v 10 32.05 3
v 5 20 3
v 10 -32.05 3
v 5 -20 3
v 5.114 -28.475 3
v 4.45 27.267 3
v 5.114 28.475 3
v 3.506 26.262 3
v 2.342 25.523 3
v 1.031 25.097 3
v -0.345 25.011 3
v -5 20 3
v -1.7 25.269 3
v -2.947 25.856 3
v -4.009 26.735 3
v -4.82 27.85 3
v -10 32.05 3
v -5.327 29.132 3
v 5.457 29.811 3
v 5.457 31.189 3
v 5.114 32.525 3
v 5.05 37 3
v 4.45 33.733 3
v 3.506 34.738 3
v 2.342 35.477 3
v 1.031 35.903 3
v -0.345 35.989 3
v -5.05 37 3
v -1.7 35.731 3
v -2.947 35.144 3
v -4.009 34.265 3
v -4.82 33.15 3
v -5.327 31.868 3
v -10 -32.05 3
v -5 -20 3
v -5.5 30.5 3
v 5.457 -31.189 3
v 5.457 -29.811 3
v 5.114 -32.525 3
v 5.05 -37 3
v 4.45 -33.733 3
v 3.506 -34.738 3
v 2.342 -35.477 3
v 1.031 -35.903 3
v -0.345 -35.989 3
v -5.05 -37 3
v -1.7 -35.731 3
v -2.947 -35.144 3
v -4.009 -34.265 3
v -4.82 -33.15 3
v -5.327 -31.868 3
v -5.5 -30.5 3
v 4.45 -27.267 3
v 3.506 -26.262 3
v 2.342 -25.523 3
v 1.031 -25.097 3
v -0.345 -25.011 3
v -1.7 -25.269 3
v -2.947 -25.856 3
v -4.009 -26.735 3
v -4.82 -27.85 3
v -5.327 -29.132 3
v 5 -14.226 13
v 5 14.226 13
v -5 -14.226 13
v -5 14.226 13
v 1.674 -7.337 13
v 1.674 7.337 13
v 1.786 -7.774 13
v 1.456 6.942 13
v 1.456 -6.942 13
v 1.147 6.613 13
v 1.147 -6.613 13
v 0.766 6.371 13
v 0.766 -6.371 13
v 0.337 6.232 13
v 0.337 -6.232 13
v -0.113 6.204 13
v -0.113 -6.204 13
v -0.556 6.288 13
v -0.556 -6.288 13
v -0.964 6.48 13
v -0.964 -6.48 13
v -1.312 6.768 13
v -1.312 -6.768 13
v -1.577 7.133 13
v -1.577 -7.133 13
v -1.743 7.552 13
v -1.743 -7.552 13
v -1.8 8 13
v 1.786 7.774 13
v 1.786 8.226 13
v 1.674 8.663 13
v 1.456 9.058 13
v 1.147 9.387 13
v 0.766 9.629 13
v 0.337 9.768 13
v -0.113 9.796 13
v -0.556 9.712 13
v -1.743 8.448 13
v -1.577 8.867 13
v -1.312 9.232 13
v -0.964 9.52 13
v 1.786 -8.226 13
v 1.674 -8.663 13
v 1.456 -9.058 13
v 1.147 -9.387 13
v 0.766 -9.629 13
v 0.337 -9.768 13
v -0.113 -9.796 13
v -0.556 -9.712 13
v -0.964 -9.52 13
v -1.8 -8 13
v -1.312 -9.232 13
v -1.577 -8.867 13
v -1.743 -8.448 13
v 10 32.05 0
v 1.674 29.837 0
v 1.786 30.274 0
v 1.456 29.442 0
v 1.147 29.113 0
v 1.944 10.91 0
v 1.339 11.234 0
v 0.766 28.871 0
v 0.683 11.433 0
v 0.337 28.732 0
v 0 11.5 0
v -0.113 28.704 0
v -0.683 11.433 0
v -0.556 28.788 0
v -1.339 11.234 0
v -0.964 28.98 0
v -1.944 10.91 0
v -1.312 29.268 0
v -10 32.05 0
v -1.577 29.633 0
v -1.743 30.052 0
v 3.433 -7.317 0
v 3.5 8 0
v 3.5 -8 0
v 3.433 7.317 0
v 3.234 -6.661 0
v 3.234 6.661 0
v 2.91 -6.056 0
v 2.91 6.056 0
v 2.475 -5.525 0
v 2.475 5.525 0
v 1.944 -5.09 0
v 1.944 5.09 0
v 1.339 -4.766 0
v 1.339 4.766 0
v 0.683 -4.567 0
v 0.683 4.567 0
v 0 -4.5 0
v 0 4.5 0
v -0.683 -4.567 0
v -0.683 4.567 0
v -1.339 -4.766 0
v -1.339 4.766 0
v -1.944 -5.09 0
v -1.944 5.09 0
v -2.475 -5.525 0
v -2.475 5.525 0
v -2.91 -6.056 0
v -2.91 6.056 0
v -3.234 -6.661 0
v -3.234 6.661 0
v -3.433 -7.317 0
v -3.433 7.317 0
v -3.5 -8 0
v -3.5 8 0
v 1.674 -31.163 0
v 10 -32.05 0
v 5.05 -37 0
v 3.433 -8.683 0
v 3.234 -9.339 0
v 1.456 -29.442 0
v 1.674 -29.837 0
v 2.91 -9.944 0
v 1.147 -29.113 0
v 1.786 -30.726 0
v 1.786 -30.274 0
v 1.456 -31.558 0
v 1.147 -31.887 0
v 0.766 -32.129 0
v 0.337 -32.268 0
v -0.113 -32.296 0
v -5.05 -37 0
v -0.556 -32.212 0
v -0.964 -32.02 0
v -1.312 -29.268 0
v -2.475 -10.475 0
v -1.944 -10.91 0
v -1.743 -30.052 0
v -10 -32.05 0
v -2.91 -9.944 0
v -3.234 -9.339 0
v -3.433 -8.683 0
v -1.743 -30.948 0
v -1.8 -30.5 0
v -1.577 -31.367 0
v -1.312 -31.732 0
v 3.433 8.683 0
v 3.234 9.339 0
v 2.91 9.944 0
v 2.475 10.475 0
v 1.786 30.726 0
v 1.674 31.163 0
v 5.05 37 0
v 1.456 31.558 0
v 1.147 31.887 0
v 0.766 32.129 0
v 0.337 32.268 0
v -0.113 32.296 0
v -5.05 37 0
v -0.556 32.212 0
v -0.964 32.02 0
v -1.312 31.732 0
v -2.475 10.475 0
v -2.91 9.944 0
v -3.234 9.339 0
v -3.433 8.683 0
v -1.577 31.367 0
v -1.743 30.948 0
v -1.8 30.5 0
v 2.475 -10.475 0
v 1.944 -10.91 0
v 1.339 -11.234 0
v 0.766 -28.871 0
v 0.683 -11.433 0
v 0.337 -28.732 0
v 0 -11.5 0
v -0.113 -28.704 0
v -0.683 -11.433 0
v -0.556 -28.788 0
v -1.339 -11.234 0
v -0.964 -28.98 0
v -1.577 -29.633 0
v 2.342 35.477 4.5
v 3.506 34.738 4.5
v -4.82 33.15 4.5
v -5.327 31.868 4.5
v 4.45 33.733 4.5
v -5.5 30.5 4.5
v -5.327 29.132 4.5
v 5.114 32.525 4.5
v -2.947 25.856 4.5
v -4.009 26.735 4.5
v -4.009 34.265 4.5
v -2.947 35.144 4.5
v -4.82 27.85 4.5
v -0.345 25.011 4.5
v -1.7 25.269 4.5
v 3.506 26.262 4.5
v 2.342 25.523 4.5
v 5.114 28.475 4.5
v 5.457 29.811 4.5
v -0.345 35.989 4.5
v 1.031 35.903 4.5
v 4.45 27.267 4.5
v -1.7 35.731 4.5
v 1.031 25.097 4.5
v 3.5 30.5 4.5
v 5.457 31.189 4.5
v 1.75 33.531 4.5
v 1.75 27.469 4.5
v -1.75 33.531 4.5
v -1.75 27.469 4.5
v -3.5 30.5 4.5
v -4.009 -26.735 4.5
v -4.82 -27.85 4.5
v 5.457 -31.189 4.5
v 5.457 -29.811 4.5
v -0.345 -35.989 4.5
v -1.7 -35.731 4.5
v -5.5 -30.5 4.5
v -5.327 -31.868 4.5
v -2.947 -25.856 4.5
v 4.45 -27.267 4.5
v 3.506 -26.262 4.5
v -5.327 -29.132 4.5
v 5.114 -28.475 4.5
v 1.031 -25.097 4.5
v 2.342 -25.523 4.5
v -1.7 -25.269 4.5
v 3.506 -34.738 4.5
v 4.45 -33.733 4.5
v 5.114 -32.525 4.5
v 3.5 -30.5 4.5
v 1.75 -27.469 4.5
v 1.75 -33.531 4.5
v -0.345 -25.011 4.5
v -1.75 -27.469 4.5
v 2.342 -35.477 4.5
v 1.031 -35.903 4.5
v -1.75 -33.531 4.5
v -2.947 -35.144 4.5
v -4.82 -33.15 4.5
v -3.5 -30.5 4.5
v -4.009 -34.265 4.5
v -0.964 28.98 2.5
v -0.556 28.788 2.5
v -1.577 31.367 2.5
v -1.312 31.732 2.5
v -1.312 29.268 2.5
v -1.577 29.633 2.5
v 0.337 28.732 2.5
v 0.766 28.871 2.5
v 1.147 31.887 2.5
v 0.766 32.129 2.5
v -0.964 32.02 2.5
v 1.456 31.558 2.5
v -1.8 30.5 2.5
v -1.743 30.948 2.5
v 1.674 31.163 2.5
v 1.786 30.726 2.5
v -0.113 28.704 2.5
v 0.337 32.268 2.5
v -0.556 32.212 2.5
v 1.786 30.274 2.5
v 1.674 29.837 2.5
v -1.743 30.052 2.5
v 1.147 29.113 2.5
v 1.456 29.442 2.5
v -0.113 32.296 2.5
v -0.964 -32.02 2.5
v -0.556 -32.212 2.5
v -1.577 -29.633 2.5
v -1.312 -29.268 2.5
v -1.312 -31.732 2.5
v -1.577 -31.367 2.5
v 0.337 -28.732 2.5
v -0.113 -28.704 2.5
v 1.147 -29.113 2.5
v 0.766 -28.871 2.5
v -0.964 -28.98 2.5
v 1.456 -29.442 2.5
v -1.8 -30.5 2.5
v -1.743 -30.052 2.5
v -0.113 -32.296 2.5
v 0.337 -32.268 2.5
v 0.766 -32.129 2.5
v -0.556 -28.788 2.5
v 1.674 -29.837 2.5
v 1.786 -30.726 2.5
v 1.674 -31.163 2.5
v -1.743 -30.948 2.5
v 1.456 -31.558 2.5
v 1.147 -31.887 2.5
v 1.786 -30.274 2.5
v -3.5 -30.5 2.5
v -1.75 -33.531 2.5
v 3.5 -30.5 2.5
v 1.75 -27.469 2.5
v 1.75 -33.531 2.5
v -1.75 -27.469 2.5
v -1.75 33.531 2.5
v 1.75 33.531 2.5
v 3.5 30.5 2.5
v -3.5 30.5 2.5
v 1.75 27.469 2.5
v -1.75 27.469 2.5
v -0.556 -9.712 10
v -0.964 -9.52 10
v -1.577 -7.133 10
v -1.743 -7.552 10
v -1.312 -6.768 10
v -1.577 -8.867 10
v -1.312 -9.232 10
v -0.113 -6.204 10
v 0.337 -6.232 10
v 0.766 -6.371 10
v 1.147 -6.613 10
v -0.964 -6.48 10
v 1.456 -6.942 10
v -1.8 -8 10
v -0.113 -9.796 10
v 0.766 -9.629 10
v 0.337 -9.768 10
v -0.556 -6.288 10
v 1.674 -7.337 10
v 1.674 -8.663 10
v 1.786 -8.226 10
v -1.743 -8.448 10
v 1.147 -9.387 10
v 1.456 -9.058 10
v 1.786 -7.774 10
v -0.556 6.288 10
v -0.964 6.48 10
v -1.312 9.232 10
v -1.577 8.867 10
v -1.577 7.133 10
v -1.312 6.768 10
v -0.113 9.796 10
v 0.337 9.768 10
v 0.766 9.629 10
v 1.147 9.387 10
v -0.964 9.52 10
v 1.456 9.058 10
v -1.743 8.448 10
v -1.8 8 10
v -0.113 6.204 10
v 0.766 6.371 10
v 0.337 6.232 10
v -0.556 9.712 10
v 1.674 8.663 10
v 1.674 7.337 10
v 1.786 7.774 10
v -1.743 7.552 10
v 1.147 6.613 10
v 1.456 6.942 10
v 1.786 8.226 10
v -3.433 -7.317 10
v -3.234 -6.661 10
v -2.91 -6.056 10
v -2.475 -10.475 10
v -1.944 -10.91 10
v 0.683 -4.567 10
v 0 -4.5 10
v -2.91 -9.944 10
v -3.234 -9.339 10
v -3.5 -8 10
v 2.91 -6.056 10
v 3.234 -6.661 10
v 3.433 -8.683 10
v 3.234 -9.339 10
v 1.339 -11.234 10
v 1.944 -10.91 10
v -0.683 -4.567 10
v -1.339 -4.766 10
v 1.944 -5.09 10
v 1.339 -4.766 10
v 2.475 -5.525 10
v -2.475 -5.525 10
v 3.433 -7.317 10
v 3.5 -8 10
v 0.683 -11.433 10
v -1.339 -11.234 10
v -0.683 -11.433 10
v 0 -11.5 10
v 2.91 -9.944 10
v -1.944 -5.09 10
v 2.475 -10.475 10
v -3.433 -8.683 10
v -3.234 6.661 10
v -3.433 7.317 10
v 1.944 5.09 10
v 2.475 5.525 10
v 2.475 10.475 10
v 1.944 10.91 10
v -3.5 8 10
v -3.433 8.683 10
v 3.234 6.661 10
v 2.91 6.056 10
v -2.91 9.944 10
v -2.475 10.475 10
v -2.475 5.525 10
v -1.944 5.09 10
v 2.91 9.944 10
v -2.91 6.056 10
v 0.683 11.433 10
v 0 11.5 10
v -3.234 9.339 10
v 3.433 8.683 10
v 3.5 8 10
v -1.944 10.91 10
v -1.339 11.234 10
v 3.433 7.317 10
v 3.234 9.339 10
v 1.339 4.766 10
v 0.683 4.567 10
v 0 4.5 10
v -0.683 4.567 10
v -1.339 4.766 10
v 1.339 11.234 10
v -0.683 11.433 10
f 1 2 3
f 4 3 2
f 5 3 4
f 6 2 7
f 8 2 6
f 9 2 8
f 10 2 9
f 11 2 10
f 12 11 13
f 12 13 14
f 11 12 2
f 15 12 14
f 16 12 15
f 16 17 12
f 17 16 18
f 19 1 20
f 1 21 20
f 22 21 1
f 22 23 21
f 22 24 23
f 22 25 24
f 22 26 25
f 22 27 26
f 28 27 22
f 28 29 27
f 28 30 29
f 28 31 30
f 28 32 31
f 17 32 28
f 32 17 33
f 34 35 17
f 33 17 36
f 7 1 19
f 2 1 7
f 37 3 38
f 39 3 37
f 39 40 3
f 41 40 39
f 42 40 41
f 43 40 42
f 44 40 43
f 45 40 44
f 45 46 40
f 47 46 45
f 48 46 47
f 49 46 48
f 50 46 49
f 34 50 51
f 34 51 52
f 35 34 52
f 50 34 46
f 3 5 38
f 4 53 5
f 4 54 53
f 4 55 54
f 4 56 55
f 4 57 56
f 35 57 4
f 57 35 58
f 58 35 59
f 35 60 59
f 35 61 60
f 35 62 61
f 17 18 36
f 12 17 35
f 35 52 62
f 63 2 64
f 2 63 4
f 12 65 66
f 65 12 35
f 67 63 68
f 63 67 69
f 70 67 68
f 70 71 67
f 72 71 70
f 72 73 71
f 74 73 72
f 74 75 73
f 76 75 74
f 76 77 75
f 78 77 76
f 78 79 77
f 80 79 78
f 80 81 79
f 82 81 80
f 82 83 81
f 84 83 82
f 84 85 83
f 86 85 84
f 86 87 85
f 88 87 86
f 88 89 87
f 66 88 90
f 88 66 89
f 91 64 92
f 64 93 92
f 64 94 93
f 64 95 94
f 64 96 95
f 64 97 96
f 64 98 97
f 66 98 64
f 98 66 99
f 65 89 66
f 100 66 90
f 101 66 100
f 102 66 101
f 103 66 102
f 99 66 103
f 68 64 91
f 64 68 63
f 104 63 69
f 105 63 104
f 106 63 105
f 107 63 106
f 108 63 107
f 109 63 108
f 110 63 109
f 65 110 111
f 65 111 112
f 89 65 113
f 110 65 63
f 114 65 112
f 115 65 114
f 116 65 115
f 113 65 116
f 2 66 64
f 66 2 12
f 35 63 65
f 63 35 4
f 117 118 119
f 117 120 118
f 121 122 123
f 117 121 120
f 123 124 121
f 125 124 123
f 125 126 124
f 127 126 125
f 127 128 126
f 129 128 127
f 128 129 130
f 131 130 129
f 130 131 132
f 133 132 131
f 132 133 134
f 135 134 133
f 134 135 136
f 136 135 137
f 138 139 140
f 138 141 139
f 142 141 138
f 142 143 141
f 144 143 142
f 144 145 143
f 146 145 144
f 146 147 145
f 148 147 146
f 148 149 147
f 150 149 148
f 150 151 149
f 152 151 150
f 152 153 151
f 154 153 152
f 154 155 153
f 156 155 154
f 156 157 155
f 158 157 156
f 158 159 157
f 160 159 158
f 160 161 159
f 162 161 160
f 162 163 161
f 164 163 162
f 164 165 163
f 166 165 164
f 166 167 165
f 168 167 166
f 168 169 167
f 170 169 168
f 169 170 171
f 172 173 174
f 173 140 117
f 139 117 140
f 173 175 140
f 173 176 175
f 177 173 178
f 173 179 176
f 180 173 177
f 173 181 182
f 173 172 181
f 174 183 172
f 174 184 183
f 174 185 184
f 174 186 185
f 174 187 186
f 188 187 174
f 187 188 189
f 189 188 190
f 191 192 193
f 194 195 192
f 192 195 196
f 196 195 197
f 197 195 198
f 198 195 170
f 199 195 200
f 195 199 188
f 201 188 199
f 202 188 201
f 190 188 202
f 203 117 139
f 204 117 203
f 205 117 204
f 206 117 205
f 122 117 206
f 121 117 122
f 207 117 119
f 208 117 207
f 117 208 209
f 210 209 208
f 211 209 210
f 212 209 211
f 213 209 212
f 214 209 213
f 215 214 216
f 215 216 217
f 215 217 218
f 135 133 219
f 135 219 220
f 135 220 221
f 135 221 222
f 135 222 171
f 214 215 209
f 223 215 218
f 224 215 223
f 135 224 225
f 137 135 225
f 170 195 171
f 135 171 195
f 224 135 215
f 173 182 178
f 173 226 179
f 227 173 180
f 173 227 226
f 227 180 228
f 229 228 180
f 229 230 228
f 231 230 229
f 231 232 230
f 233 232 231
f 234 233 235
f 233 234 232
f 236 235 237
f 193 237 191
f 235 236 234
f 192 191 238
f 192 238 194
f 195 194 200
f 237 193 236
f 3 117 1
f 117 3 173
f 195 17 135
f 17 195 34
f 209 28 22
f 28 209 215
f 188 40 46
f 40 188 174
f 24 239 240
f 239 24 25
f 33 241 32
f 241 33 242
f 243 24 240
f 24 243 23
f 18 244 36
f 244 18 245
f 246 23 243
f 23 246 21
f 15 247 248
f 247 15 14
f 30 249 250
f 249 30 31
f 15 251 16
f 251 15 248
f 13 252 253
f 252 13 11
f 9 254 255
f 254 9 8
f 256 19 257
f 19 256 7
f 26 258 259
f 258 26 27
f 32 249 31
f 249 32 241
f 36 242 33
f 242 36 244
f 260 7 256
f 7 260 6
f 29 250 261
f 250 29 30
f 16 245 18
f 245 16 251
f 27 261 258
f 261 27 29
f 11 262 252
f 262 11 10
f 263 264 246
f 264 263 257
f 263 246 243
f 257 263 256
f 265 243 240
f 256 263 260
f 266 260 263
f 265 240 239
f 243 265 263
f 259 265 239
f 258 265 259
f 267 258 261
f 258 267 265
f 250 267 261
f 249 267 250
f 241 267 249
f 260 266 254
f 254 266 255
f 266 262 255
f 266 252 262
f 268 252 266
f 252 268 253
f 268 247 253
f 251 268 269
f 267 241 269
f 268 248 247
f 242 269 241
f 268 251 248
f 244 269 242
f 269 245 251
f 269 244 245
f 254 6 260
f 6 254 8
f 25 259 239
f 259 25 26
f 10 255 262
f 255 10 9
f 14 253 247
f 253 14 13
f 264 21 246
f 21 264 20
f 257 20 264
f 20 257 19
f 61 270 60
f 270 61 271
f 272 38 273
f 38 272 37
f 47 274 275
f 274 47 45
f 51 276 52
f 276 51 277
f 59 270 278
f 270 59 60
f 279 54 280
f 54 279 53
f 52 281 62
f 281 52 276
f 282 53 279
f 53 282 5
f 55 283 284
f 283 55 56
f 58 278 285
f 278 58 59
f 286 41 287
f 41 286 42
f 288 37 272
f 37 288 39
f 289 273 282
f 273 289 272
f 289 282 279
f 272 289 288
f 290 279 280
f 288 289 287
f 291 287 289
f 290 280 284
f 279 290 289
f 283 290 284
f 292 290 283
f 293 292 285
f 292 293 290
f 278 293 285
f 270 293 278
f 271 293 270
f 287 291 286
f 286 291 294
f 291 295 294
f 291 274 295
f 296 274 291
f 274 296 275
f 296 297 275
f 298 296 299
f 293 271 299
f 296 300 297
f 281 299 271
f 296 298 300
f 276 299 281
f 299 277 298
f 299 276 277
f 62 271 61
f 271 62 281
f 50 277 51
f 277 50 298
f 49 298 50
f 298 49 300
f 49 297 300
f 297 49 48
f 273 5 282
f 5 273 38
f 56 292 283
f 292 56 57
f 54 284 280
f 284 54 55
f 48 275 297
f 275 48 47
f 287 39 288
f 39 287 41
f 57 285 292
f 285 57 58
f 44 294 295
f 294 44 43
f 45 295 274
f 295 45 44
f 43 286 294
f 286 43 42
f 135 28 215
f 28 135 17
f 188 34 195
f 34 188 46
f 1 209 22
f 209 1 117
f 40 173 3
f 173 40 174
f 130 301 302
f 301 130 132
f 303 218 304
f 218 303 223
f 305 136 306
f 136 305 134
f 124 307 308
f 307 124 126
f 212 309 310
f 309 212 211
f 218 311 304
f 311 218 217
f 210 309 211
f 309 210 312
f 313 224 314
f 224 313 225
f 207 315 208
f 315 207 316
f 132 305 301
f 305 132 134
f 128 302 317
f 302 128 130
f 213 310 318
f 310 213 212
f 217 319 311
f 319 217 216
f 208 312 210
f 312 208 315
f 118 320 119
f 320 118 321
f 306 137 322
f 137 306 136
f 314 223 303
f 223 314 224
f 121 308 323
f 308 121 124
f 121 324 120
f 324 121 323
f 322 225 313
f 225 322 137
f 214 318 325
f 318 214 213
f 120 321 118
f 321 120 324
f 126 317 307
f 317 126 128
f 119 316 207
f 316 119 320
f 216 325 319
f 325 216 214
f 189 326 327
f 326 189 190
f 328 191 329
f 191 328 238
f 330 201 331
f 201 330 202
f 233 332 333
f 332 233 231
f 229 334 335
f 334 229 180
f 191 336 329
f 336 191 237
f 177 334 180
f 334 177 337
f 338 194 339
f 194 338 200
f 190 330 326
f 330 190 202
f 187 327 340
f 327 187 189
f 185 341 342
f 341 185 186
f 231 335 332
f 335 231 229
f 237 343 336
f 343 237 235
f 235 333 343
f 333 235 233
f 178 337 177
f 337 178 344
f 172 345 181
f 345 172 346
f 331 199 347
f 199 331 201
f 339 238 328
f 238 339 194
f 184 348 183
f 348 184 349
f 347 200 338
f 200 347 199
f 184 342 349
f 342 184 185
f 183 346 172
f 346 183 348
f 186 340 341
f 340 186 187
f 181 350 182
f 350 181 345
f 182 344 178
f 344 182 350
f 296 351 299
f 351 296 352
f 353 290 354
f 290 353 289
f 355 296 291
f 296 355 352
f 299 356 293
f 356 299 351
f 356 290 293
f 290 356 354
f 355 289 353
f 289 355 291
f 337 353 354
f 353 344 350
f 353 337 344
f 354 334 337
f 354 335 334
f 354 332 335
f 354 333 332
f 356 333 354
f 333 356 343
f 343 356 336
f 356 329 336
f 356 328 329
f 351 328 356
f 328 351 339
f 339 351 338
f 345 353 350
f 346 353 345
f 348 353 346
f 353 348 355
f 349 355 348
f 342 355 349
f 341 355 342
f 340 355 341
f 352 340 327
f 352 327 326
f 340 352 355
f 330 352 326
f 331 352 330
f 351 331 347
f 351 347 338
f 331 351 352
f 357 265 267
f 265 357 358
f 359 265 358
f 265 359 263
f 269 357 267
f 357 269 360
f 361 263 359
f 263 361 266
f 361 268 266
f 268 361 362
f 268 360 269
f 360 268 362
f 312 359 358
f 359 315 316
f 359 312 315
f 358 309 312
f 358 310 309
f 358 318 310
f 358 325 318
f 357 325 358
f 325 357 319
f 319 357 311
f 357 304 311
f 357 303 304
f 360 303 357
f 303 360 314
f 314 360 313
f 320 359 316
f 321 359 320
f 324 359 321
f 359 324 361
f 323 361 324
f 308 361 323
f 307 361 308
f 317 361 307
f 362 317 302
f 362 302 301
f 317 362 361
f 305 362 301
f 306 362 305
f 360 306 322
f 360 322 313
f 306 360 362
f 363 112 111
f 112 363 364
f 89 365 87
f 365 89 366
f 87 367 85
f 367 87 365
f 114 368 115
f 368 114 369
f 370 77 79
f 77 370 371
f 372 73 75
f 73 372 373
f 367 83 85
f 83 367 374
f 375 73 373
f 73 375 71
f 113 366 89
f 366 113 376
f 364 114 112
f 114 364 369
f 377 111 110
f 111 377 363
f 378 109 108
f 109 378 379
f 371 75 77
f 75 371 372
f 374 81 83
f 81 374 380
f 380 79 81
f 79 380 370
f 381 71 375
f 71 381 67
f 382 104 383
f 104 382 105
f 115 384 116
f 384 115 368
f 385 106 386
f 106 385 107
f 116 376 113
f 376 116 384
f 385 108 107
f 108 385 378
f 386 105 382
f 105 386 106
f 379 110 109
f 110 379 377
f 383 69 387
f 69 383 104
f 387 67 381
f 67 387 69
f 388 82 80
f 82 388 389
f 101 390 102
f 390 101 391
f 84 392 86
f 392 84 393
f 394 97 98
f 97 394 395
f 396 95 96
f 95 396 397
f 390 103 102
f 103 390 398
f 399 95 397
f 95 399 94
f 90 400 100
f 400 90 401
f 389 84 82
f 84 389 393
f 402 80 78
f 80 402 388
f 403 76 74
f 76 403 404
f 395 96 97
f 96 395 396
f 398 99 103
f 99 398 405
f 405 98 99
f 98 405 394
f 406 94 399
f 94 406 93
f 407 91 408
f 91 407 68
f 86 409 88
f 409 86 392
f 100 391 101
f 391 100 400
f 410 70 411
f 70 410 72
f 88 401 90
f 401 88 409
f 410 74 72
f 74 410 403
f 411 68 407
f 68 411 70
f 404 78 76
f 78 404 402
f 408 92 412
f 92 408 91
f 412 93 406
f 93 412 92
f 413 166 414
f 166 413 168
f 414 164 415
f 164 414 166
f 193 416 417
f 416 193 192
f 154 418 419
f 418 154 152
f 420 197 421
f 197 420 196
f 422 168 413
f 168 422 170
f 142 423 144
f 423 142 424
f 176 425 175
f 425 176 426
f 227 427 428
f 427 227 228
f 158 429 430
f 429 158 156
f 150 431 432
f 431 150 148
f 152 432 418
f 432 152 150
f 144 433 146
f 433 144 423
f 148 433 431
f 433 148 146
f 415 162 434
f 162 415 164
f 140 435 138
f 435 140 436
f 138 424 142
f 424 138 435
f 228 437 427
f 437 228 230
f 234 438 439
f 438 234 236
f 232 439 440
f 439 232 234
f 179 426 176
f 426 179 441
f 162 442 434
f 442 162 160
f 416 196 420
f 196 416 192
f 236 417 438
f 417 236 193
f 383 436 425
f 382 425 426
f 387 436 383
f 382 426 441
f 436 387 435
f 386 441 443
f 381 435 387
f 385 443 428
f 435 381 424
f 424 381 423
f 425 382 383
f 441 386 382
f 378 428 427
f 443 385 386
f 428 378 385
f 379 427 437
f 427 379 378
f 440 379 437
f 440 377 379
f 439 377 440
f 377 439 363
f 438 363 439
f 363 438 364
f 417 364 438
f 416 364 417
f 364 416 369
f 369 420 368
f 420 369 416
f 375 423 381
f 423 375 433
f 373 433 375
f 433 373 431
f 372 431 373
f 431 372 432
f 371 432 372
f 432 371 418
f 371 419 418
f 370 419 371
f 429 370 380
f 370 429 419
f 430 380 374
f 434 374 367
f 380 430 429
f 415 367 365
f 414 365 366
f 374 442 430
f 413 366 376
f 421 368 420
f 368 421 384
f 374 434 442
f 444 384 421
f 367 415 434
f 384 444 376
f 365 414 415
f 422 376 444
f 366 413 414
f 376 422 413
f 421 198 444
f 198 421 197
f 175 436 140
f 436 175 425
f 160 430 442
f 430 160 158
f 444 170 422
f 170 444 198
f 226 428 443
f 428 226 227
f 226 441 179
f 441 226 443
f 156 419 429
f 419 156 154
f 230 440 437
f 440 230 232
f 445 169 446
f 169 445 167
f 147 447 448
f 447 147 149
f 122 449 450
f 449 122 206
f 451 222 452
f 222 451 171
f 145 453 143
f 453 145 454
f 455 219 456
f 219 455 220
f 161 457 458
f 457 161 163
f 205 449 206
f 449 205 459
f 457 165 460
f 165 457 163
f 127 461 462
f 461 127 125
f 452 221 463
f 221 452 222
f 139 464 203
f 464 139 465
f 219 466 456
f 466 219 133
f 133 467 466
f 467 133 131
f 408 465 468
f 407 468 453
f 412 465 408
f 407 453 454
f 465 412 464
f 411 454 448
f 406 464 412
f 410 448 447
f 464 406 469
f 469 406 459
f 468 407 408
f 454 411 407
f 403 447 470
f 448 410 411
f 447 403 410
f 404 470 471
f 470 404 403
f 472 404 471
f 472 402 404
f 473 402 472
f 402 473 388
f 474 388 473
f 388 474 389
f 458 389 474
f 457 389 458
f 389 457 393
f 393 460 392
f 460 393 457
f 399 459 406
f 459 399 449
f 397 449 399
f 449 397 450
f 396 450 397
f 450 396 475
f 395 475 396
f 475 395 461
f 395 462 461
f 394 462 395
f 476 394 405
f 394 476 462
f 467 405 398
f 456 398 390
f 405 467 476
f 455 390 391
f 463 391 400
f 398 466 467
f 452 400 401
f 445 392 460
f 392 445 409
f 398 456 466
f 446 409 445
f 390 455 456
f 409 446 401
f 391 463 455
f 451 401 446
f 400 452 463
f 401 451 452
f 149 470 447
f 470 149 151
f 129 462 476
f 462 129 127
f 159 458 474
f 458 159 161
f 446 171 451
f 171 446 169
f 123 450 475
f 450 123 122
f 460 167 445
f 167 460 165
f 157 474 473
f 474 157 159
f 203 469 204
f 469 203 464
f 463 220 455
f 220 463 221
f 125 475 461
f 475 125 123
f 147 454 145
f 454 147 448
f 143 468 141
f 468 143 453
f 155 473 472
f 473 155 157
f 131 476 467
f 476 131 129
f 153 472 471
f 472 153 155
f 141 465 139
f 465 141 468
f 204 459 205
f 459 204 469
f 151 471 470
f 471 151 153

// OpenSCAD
// file: configuration.scad
// Increase this if your slicer or printer make holes too tight.
extra_radius = 0.1;
extra_extrusion_width = 0.5;

// OD = outside diameter, corner to corner.
m3_nut_od = 6.1;
m3_nut_radius = m3_nut_od/2 + 0.35 + extra_radius;
m3_washer_radius = 3.5 + extra_radius;

// Major diameter of metric 3mm thread.
m3_major = 2.85;
m3_radius = m3_major/2 + extra_radius;
m3_wide_radius = m3_major/2 + extra_radius;

// NEMA17 stepper motors.
motor_shaft_diameter = 5;
motor_shaft_radius = motor_shaft_diameter/2 + extra_radius;

// Frame brackets. M3x8mm screws work best with 3.6 mm brackets.
thickness = 3.6;

// OpenBeam or Misumi. Currently only 15x15 mm, but there is a plan
// to make models more parametric and allow 20x20 mm in the future.
extrusion = 15;

// Placement for the NEMA17 stepper motors.
motor_offset = 44;
motor_length = 47;
// main file
// Airtripper's Bowden 3D Printer Extruder Revision 3 bsp
// by Airtripper May 2012
// Copyright � 2012 - 2013 Airtripper
// airtripper.com
// It is licensed under the Creative Commons - GNU GPL license. 

// Parametrized and modified by Thomas T. Sørensen
// Last edited by Thomas T. Sørensen: 2014-11-13

include <configuration.scad>;

idler_bearing_offset = -1.5;

strut_height = 9.5;
strut_screw_depth = 0.5;


// What part do you want to view?

preview_part = 11; // [1:Extruder,2:Idler,3:Idler with brim,4:Strut,5:Axle,6:Tube Bracket,7:All Parts, 8: extruder & axle, 9: idler & strut, 10: spring bracket, 11: holder]


// *****************************************************

if (preview_part == 1) {
	translate([0,0,0]) rotate([0,0,270]) extruder_block();
}
if (preview_part == 2) {
	extruder_idler_625();
} 
if (preview_part == 3) {
	idler_and_flange();
}
if (preview_part == 4) {
	support_strut();
} 
if (preview_part == 5) {
	axle_5mm();
}
if (preview_part == 6) {
	translate([15,-15,0]) rotate([0,0,90]) tube_bracket();
}
if (preview_part == 7) {
	translate([0,-20,0]) rotate([0,0,270]) extruder_block();
	translate([20,16,0]) rotate([0,0,90]) extruder_idler_608z(); //idler_and_flange();
	translate([22,35,0]) rotate([0,0,0]) support_strut();
	translate([-10,10,0]) rotate([0,0,0]) axle_8mm();
	translate([-36,8,0]) rotate([0,0,0]) tube_bracket();
} 
if (preview_part == 8) {
	translate([0,-10,0]) rotate([0,0,270]) extruder_block();
	translate([-0,22,0]) rotate([0,0,0]) axle_8mm();
}
if (preview_part == 9) {
	translate([0,-8,0]) rotate([0,0,90]) extruder_idler_608z(); //idler_and_flange();
	translate([0,10,0]) rotate([0,0,0]) support_strut();
} 
if (preview_part == 10) {
	spring_bracket();
}
if (preview_part == 11) {
	extruder_holder();
}

// ************** Extruder holder ***********************

module extruder_holder(){
	//extruder_block();
	translate([-10,0,-18.5]) rotate([0,90,0])
	difference() {
		union(){
			translate([-20,0,10]) cube([3,74,20], center = true);
			translate([-23,30.5,10]) rotate([0,90,0]) cylinder(2, r=5.5, $fn=25);	
			translate([-23,-30.5,10]) rotate([0,90,0]) cylinder(2, r=5.5, $fn=25);
			difference(){
				translate([-26.5,0,10]) cube([10,40,10], center=true);
				translate([-26.5,20,10]) rotate([0,0,30]) cube([15,5,15], center=true);
				translate([-26.5,-20,10]) rotate([0,0,-30]) cube([15,5,15], center=true);
			}
		}
		union() {
			// fixing plate cutout
			translate([-20,37,0]) rotate([45,0,0]) cube([6,16,7], center = true);
			translate([-20,-37,0]) rotate([135,0,0]) cube([6,16,7], center = true);
			translate([-20,37,20]) rotate([135,0,0]) cube([6,16,7], center = true);
			translate([-20,-37,20]) rotate([45,0,0]) cube([6,16,7], center = true);
			// M3 bolt holes
			translate([-25,30.5,10]) rotate([0,90,0]) cylinder(10, r=1.8, $fn=25);
			translate([-25,-30.5,10]) rotate([0,90,0]) cylinder(10, r=1.8, $fn=25);	
			//M3 nut traps
			translate([-24,-30.5,10]) rotate([0,90,0]) cylinder(3, r=m3_nut_radius, $fn=6);	
			translate([-24,30.5,10]) rotate([0,90,0]) cylinder(3, r=m3_nut_radius, $fn=6);
			//Mounting holes
			translate([-40,-8,10]) rotate([0,90,0]) cylinder(30, r=1.8, $fn=25);	
			translate([-40,8,10]) rotate([0,90,0]) cylinder(30, r=1.8, $fn=25);
			translate([-28.5,-8,10]) rotate([0,90,0]) cylinder(20, r=3.5, $fn=32);	
			translate([-28.5,8,10]) rotate([0,90,0]) cylinder(20, r=3.5, $fn=32);
		}
	}
}

// ************** Spring bracket ***********************

module spring_bracket(){
	difference(){
		cube([22, 6, 3], center=true);
		translate([6,0,0]) cylinder(h=6, r=1.75, center=true, $fn=48);
		translate([-6,0,0]) cylinder(h=6, r=1.75, center=true, $fn=48);
		translate([-3, -.75, 0]) cube([6, 1.5, 2]); 
		translate([1.5, 0, 0]) cube([1.5, 6, 2]); 
		translate([-3, -6, 0]) cube([1.5, 6, 2]);
	}
}

// ************** Idler with Flange ***********************

module idler_and_flange() {
	extruder_idler_608z();
	difference() {
		union() {
			difference() {
				translate([0,0,0.5]) color("red") cube([36,55,1], center=true);
				translate([0,0,-0.1]) scale([1.1,1.1,1.1]) extruder_idler_608z();
			}
			for(r=[1:5]) {
				translate([0,r*70/10-22,0.5]) cube([30,1,1], center=true);
				translate([r*64/10-19,0,0.5]) rotate([0,0,90]) cube([50,1,1], center=true);
			}
		}
		union() {
			translate([0,0,0.5]) color("red") cube([12,28,2], center=true);
			translate([0,0,0.5]) color("red") cube([18,10,2], center=true);
		}
	}


}



// ##########################################################

module axle_8mm() {
	cylinder(14.25,r=3.80, $fn=40);
	// Support flange while printing
//	translate([-5,-0.5,0]) cube([10,1,0.5]);
//	translate([-0.5,-5,0]) cube([1,10,0.5]);
//	difference() {
//		cylinder(0.5,r=10, $fn=40);
//		translate([0,0,-1]) cylinder(3,r=5, $fn=40);
//	}
}

module axle_5mm() {
	cylinder(14.25,r=2.3, $fn=40);
}


// ##########################################################

//extruder_idler_608z();

module extruder_idler_608z() {
	difference() {
		union() {
			difference() {
				translate([0,0,7]) cube([22,42,14], center = true);
				// Bearing housing
				//#translate([-6,0,8]) cube([10,50,20], center = true);
				translate([0,0,1]) cube([10,24,10], center = true);
				translate([-5,0,6]) rotate([0,90,0]) cylinder(10,r=12, $fn=60);
			}
			// Axle spacer
			translate([-8,0,6]) rotate([0,90,0]) cylinder(16,r=6, $fn=40);
			translate([0,0,3]) cube([16,12,6], center = true);
		}
		union() {
			// Bearing axle cut-out
			translate([-7.75,0,6]) rotate([0,90,0]) cylinder(15.5,r=4.25, $fn=40);
			translate([0,0,2]) cube([14.2,8.5,8], center = true);
			translate([-4.5,0,0]) rotate([0,20,0]) cube([6,8.5,8], center = true);
			translate([4.5,0,0]) rotate([0,-20,0]) cube([6,8.5,8], center = true);
			translate([-3.7,0,6]) rotate([0,90,0]) cylinder(7.4,r=12, $fn=60);
			// hook
			translate([-12,-15.5,6]) rotate([0,90,0]) cylinder(24,r=2, $fn=25);
			translate([0,-18.5,11]) cube([24,10,10], center = true);
			translate([9.5,-17,1]) cube([4,16,16], center = true);
			translate([-9.5,-17,1]) cube([4,16,16], center = true);
			translate([0,-21,0]) rotate([45,0,0]) cube([24,6,10], center = true);
			translate([-11,-12,9.6]) rotate([0,135,0]) cube([4,6,6], center = true);
			translate([11,-12,9.6]) rotate([0,45,0]) cube([4,6,6], center = true);
			// Bolt slots
			translate([6,20,7]) cube([3.5,10,16], center = true);
			translate([-6,20,7]) cube([3.5,10,16], center = true);
			translate([0,24,7]) rotate([154,0,0]) cube([24,10,26], center = true);
			translate([0,26.5,25]) rotate([145,0,0]) cube([24,10,26], center = true);
			translate([0,25.5,7]) cube([22,10,16], center = true);
			//Padding
			//translate([-9,-17,7]) cube([6,10,16], center = true);
		}
	}

}

module extruder_idler_625(){
	difference() {
		union() {
			difference() {
				translate([0,0,7]) cube([22,42,14], center = true);
				// Bearing housing
				//#translate([-6,0,8]) cube([10,50,20], center = true);
				translate([0,0,7]) cube([10,18,15], center = true);
				//translate([-5,0,3+idler_bearing_offset]) rotate([0,90,0]) cylinder(10,r=12, $fn=60);
			}
			// Axle spacer
			translate([-8,0,3+idler_bearing_offset]) rotate([0,90,0]) cylinder(16,r=5.5, $fn=40);
			translate([0,0,idler_bearing_offset-1.5]) cube([16,11,9], center = true);
		}
		union() {
			// Bearing axle cut-out
			translate([-7.75,0,3+idler_bearing_offset]) rotate([0,90,0]) cylinder(15.5,r=2.75, $fn=40);
			translate([0,0,idler_bearing_offset-1]) cube([14.2,5.5,8], center = true);
			translate([-4.5,0,idler_bearing_offset-3]) rotate([0,20,0]) cube([6,5.5,8], center = true);
			translate([4.5,0,idler_bearing_offset-3]) rotate([0,-20,0]) cube([6,5.5,8], center = true);
			translate([-3.0,0,3+idler_bearing_offset]) rotate([0,90,0]) cylinder(6.0,r=12, $fn=60);
         //#translate([-3.0,0,3+idler_bearing_offset]) rotate([0,90,0]) cylinder(6.0,r=8, $fn=60);
			translate([0,0,-7]) cube([22, 42, 14], center=true);
			// hook
			translate([-12,-15.5,6]) rotate([0,90,0]) cylinder(24,r=2, $fn=25);
			translate([0,-18.5,11]) cube([24,10,10], center = true);
			translate([9.5,-17,1]) cube([4,16,16], center = true);
			translate([-9.5,-17,1]) cube([4,16,16], center = true);
			translate([0,-21,0]) rotate([45,0,0]) cube([24,6,10], center = true);
			translate([-11,-12,9.6]) rotate([0,135,0]) cube([4,6,6], center = true);
			translate([11,-12,9.6]) rotate([0,45,0]) cube([4,6,6], center = true);
			// Bolt slots
			translate([6,20,7]) cube([3.5,10,16], center = true);
			translate([-6,20,7]) cube([3.5,10,16], center = true);
			translate([0,24,7]) rotate([154,0,0]) cube([24,10,26], center = true);
			translate([0,26.5,25]) rotate([145,0,0]) cube([24,10,26], center = true);
			translate([0,25.5,7]) cube([22,10,16], center = true);
			//Padding
			//translate([-9,-17,7]) cube([6,10,16], center = true);
		}
	}
}


// #########################################################

// Revision 3b

module extruder_block() {
	difference() {
		union() {
			// Extruder base
			translate([0,0,1.5]) cube([42,42,3], center = true);

			// Bearing supports between screw columns and shaft bearing
			rotate([0,0,45]) translate([0,11,13]) cube([3,22,26], center = true);
			rotate([0,0,315]) translate([0,-11,13]) cube([3,22,26], center = true);
			difference() {
				translate([-3,0,22]) cylinder(8,r1=4, r2=4, $fn=50, center = true);
				rotate([0,90,0]) translate([-17,0,-10]) cylinder(8,r=4, $fn=50);
			}
			difference() {
				translate([0,0,3]) cylinder(22,r1=13.5, r2=6.3, $fn=100);	// rev. 3
				rotate([0,0,45]) translate([8,0,13]) cube([15,30,26.5], center = true);	// rev. 3
				rotate([0,0,315]) translate([8,0,13]) cube([15,30,26.5], center = true);	// rev. 3
			}
			// M3 Screw columns for stepper attachment
			translate([-15.5,15.5,0]) cylinder(26,r=4, $fn=50);	// rev. 3
			translate([-15.5,15.5,18]) cylinder(8,r1=4,r2=6, $fn=50);	// rev. 3
			translate([-15.5,-15.5,0]) cylinder(23.5,r=4, $fn=50);	// rev. 3
			translate([-15.5,-15.5,17.5]) cylinder(6,r1=4,r2=5, $fn=50);	// rev. 3
			translate([15.5,-15.5,3]) cylinder(1.5,r=3.5, $fn=50);	// rev. 3

			// fixing plate
			difference() {
				translate([-20,0,10]) cube([3,74,20], center = true);
				union() {

					// fixing plate cutout
					translate([-20,0,12]) cube([6,30,18], center = true);
					translate([-20,37,0]) rotate([45,0,0]) cube([6,16,7], center = true);
					translate([-20,-37,0]) rotate([135,0,0]) cube([6,16,7], center = true);
					translate([-20,37,20]) rotate([135,0,0]) cube([6,16,7], center = true);
					translate([-20,-37,20]) rotate([45,0,0]) cube([6,16,7], center = true);
					// M6 bolt holes
					translate([-23,30.5,10]) rotate([0,90,0]) cylinder(6, r=3.5, $fn=25);
					translate([-23,-30.5,10]) rotate([0,90,0]) cylinder(6, r=3.5, $fn=25);
				}
			} // End of fixing plate
		}
		union() {
			// Stepper shaft, gear insert and bearing cut-out
			translate([0,0,9.8]) cylinder(20,r1=13, r2=5, $fn=50, center = true);	// rev. 3
			translate([0,0,22]) cylinder(5,r=5, $fn=50, center = true);
			translate([0,0,27]) cylinder(8	,r=4, $fn=50, center = true);
			translate([0,0,25.5]) cylinder(2,r1=5, r2=4, $fn=50, center = true);
			translate([0,0,10.5]) cylinder(8	,r=7, $fn=100);	// rev. 2
			translate([0,0,18.5]) cylinder(3.5,r1=7, r2=3.5, $fn=50);	// rev. 2

			// Reduce wall and screw shaft for strut placement
			translate([-15.5,-15.5,23.5]) cylinder(5,r=3, $fn=30);
			translate([-12.5,-15.5,25.5]) cube([12,9,4], center = true);
			translate([-11.4,-11.4,27.9]) rotate([25,0,315]) cube([5,10,5], center = true);

			// M3 screw holes
			for(r=[1:4]) {
				rotate([0,0,r*360/4]) translate([15.5,15.5,-1]) cylinder(40,r=1.75, $fs=.1);
			}
			translate([-15.5,15.5,22.1]) cylinder(4,r=3.3, $fn=30);	// rev. 3
			translate([15.5,15.5,1.5]) cylinder(4,r=3.25, $fs=.1);	// rev. 3
		}
	}
	// Filament in-feed bracket
	difference() {
		union() {
			translate([8.75,-20,3]) rotate([0,0,90]) infeed_block();	// rev. 3
			translate([-12,-17,3]) rotate([0,0,-12]) cube([14,2,16]);	// rev. 3
		}
		//%translate([4.8,-8,15]) rotate([90,0,0]) cylinder(18, r=1.3, $fn=25);	// rev. 2, 3
		//%translate([4.8,-21,15]) rotate([90,0,0]) cylinder(8, r1=1.1, r2=4, $fn=25);	// rev. 3
		//#translate([0,0,10]) cylinder(20,r1=13, r2=5, $fn=50, center = true);
		// #translate([5,-10,13]) cube([10,6,20], center = true);	// rev. 2, 3
	}
	// Bowdon out-feed tube holder
	difference() {
		union() {
			translate([4.8,14,13]) cube([8,14,26], center = true);
			//translate([4.8,25,10]) cube([14,8,20], center = true);	// rev. 3, 3b
			translate([-5.5,12.5,13]) cube([13.5,3,26], center = true);	// rev. 3
			// translate([0,12.5,13]) cube([2,3,26], center = true);	// rev. 3
			// translate([-4.5,12.5,4]) cube([13.5,3,3], center = true);	// rev. 3
			// #translate([0,17,17]) cube([2,6,20], center = true);	// rev. 3
			translate([3.3,21,13]) cube([11,3,26], center = true);	// rev. 3
			translate([11.8,17.5,0]) rotate([0,0,90]) bsp_push_fit();
		}
		union() {
			// Tube and filament holes
			//#translate([4.8,36,15]) rotate([90,0,0]) cylinder(16, r=2.25, $fn=25);	// 3b
			translate([4.8,24,15]) rotate([90,0,0]) cylinder(20, r=1.15, $fn=25);	// rev. 2, 3
			translate([5.3,16,15]) rotate([90,0,5]) cylinder(10, r1=0.4, r2=3, $fn=25);	// rev. 3

			// Insert and idler clearance
			translate([0,0,9.9]) cylinder(20,r1=13, r2=5, $fn=50, center = true);	// rev. 3

			// M3 bolt holes for idler preloader
			translate([3,17,20.5]) rotate([0,90,12]) cylinder(10, r=2.75, $fn=25);	// rev. 3
			translate([3,17,9.5]) rotate([0,90,12]) cylinder(10, r=2.75, $fn=25);	// rev. 3
			translate([-0.5,17,20.5]) rotate([0,90,0]) cylinder(10, r=2, $fn=25);
			translate([-0.5,17,9.5]) rotate([0,90,0]) cylinder(10, r=2, $fn=25);

			// m4 nut slot
			//#translate([4.8,24.5,16]) cube([7.45,3.45,10.5], center = true);	// rev. 3, 3b
			//#translate([4.8,27.5,19.5]) cube([4.5,3.2,9.2], center = true);	// rev.	3, 3b

			// just a hole
			//translate([4.8,42,6]) rotate([90,0,0]) cylinder(16, r=4.5, $fn=25);	// rev. 3, 3.5b
			translate([-3.5,15.5,9.5]) rotate([90,0,0]) cylinder(6, r=3.5, $fn=25);	// rev. 3
			translate([-3.5,15.5,20.5]) rotate([90,0,0]) cylinder(6, r=3.5, $fn=25);	// rev. 3

			// Bowden filament guide in-feed Cut off
			translate([11,7.5,14]) rotate([0,0,35]) cube([8,4,28], center = true);	// rev. 3
			translate([4.5,8.5,25]) cube([10,4,10], center = true);	// rev. 3
		}
	}
	
}

// #########################################################


//bsp_push_fit();


module bsp_push_fit() {
	bsp = 10;
	x_nuj = 0;
	
	difference() {
		union() {
			//translate([0,3,0]) cube([3,11,26]);
			difference() {
				translate([3+x_nuj,7,15]) rotate([0,90,0]) cylinder(12, r=(bsp/2)+5, $fn=100);
				translate([11+x_nuj-3,7,19.5]) rotate([0,90,0]) cylinder(15+3, r=1.5, $fn=50);
				translate([-5+x_nuj,20,3]) rotate([0,0,-45]) cube([10,10,26]);
			}
			difference() {
				translate([3+x_nuj,0,0]) cube([12,14,15]);
				translate([2+x_nuj,-1,-7]) rotate([0,50,0]) cube([10,16,26]);
			}
		}
		translate([8+x_nuj,7,15]) rotate([0,90,0]) cylinder(8, r=(bsp/2), $fn=100);
		translate([-1,7,15]) rotate([0,90,0]) cylinder(19, r=1.15, $fn=30);
		translate([11.2+x_nuj,7,-1]) rotate([0,0,0]) cylinder(15, r=1.75, $fn=50);	// M3 Screw hole
		translate([11.2+x_nuj,7,7]) rotate([0,0,30]) cylinder(5, r=3.5, $fn=6);	// M3 Screw hex nut hole
		translate([11.2+x_nuj,5.3,-1]) cube([6,3.4,15]);
		translate([11.2+x_nuj,7,-1]) rotate([0,0,0]) cylinder(2, r=3.5, $fn=50);
		translate([11.2+x_nuj,7,0.99]) rotate([0,0,0]) cylinder(3, r1=3.5, r2=1.75, $fn=50);
		translate([-2+x_nuj,-9,3]) rotate([0,0,20]) cube([10,10,26]);
	}
}


// #########################################################

//support_strut();

module support_strut() {

	difference() {
		union() {
			translate([-15.5,0,0]) cylinder(strut_height, r=5, $fn=30);
			translate([15.5,0,0]) cylinder(strut_height, r=5, $fn=30);
			translate([-15.5,-3.5,0]) cube([31,7,strut_height]);
		}
		union() {
			// Screw holes
			translate([-15.5,0,strut_height/2]) cylinder(strut_height*2, r=1.75, $fn=30, center=true);
			translate([15.5,0,strut_height/2]) cylinder(strut_height*2, r=1.75, $fn=30, center=true);
			if(strut_screw_depth > 0){
				translate([-15.5,0,strut_height-strut_screw_depth]) cylinder(strut_height, r=3, $fn=30);
				translate([15.5,0,strut_height-strut_screw_depth]) cylinder(strut_height, r=3, $fn=30);
			}
		}
	}
}


// #########################################################



//infeed_block();

infeed_choice = 2;

module infeed_block() {

	if (infeed_choice == 1) {
		difference() {
			union() {
				 polyhedron(
				  points=[ [0,0,0],[0,8,0],[2,8,0],[2,0,0], // the six points at base
							[-5,0,8],[-5,8,8],[7,0,8],[7,8,8],
							[-5,0,16],[-5,8,16],[7,0,16],[7,8,16]
							],
							
				  triangles=[ [0,3,1],[2,1,3],
							[4,0,1],[1,5,4],[7,2,3],[7,3,6],
							[1,2,5],[2,7,5],[4,6,0],[6,3,0],
							[11,9,5],[5,7,11],[10,11,7],[7,6,10],
							[5,9,8],[8,4,5],[4,8,10],[10,6,4],[8,9,11],[11,10,8]
							]          // each triangle side
													 // two triangles for square base
				 );
			}
			translate([8,4,12]) rotate([0,-90,0]) cylinder(22, r=1.3, $fn=60);
			translate([-1,4,12]) rotate([0,-90,0]) cylinder(5, r1=1.3, r2=2.2, $fn=60);
			
		}
	}


	if (infeed_choice == 2) {
		difference() {
			union() {
				 polyhedron(
				  points=[ [-3,0,-3],[-3,8,-3],[2,8,-3],[2,0,-3], // the six points at base
							[-12,0,6],[-12,8,6],[7,0,8],[7,8,8],
							[-5,0,16],[-5,8,16],[7,0,16],[7,8,16]
							],
							
				  triangles=[ [0,3,1],[2,1,3],
							[4,0,1],[1,5,4],[7,2,3],[7,3,6],
							[1,2,5],[2,7,5],[4,6,0],[6,3,0],
							[11,9,5],[5,7,11],[10,11,7],[7,6,10],
							[5,9,8],[8,4,5],[4,8,10],[10,6,4],[8,9,11],[11,10,8]
							]          // each triangle side
													 // two triangles for square base
				 );
				translate([-2,4,12]) rotate([0,-90,0]) cylinder(10, r=5.9, $fn=100);
				translate([1,4,12]) rotate([0,-90,0]) cylinder(3, r1=4, r2=5.9, $fn=100);
			}
			translate([8,4,12]) rotate([0,-90,0]) cylinder(22, r=1.3, $fn=25);
			translate([-2.9,4,12]) rotate([0,-90,0]) cylinder(12, r=2.15, $fn=60);
			translate([0,4,12]) rotate([0,-90,0]) cylinder(3, r1=1.3, r2=2.15, $fn=60);
		}
	}

}

// #########################################################



//tube_bracket();


module tube_bracket() {
		difference() {
			union() {
				translate([0,10,0]) cube([30,10,10]);	// Pipe bracket
				difference() {
					translate([5,0,0]) cube([10,30,3]);	// Screw bracket
					difference() {
						translate([10,15,-1]) rotate([0,0,0]) cylinder(5, r=20, $fn=100);
						translate([10,15,-1]) rotate([0,0,0]) cylinder(5, r=15, $fn=100);
					}
				}
			}
			translate([-1,15,5]) rotate([0,90,0]) cylinder(32, r=1.15, $fn=60);	// filament tube hole
			translate([-0.95,15,5]) rotate([0,90,0]) cylinder(11, r=2.14, $fn=60);	// Pipe hole infeed
			translate([20,15,5]) rotate([0,90,0]) cylinder(11, r=2.11, $fn=60);	// Pipe hole outfeed
			translate([10,15,5]) rotate([0,90,0]) cylinder(5, r1=2.2, r2=1.3, $fn=60);	// Infeed hole taper
			translate([10,25,-1]) rotate([0,0,0]) cylinder(5, r=2.2, $fn=60);	// Screw holes
			translate([10,5,-1]) rotate([0,0,0]) cylinder(5, r=2.2, $fn=60);	// Screw holes
			translate([-7,4.4,9]) rotate([0,0,45]) cube([15,15,5]);	// Pipe bracket direction mark
			difference() {
				translate([10,4.4,9]) rotate([0,0,0]) cube([25,25,7]);	// Pipe bracket direction mark
				translate([19.4,4.4,9]) rotate([0,0,45]) cube([15,15,5]);	// Pipe bracket direction mark
				translate([0,4.4,9]) rotate([0,0,0]) cube([25,25,7]);	// Pipe bracket direction mark
			}
		}
}
